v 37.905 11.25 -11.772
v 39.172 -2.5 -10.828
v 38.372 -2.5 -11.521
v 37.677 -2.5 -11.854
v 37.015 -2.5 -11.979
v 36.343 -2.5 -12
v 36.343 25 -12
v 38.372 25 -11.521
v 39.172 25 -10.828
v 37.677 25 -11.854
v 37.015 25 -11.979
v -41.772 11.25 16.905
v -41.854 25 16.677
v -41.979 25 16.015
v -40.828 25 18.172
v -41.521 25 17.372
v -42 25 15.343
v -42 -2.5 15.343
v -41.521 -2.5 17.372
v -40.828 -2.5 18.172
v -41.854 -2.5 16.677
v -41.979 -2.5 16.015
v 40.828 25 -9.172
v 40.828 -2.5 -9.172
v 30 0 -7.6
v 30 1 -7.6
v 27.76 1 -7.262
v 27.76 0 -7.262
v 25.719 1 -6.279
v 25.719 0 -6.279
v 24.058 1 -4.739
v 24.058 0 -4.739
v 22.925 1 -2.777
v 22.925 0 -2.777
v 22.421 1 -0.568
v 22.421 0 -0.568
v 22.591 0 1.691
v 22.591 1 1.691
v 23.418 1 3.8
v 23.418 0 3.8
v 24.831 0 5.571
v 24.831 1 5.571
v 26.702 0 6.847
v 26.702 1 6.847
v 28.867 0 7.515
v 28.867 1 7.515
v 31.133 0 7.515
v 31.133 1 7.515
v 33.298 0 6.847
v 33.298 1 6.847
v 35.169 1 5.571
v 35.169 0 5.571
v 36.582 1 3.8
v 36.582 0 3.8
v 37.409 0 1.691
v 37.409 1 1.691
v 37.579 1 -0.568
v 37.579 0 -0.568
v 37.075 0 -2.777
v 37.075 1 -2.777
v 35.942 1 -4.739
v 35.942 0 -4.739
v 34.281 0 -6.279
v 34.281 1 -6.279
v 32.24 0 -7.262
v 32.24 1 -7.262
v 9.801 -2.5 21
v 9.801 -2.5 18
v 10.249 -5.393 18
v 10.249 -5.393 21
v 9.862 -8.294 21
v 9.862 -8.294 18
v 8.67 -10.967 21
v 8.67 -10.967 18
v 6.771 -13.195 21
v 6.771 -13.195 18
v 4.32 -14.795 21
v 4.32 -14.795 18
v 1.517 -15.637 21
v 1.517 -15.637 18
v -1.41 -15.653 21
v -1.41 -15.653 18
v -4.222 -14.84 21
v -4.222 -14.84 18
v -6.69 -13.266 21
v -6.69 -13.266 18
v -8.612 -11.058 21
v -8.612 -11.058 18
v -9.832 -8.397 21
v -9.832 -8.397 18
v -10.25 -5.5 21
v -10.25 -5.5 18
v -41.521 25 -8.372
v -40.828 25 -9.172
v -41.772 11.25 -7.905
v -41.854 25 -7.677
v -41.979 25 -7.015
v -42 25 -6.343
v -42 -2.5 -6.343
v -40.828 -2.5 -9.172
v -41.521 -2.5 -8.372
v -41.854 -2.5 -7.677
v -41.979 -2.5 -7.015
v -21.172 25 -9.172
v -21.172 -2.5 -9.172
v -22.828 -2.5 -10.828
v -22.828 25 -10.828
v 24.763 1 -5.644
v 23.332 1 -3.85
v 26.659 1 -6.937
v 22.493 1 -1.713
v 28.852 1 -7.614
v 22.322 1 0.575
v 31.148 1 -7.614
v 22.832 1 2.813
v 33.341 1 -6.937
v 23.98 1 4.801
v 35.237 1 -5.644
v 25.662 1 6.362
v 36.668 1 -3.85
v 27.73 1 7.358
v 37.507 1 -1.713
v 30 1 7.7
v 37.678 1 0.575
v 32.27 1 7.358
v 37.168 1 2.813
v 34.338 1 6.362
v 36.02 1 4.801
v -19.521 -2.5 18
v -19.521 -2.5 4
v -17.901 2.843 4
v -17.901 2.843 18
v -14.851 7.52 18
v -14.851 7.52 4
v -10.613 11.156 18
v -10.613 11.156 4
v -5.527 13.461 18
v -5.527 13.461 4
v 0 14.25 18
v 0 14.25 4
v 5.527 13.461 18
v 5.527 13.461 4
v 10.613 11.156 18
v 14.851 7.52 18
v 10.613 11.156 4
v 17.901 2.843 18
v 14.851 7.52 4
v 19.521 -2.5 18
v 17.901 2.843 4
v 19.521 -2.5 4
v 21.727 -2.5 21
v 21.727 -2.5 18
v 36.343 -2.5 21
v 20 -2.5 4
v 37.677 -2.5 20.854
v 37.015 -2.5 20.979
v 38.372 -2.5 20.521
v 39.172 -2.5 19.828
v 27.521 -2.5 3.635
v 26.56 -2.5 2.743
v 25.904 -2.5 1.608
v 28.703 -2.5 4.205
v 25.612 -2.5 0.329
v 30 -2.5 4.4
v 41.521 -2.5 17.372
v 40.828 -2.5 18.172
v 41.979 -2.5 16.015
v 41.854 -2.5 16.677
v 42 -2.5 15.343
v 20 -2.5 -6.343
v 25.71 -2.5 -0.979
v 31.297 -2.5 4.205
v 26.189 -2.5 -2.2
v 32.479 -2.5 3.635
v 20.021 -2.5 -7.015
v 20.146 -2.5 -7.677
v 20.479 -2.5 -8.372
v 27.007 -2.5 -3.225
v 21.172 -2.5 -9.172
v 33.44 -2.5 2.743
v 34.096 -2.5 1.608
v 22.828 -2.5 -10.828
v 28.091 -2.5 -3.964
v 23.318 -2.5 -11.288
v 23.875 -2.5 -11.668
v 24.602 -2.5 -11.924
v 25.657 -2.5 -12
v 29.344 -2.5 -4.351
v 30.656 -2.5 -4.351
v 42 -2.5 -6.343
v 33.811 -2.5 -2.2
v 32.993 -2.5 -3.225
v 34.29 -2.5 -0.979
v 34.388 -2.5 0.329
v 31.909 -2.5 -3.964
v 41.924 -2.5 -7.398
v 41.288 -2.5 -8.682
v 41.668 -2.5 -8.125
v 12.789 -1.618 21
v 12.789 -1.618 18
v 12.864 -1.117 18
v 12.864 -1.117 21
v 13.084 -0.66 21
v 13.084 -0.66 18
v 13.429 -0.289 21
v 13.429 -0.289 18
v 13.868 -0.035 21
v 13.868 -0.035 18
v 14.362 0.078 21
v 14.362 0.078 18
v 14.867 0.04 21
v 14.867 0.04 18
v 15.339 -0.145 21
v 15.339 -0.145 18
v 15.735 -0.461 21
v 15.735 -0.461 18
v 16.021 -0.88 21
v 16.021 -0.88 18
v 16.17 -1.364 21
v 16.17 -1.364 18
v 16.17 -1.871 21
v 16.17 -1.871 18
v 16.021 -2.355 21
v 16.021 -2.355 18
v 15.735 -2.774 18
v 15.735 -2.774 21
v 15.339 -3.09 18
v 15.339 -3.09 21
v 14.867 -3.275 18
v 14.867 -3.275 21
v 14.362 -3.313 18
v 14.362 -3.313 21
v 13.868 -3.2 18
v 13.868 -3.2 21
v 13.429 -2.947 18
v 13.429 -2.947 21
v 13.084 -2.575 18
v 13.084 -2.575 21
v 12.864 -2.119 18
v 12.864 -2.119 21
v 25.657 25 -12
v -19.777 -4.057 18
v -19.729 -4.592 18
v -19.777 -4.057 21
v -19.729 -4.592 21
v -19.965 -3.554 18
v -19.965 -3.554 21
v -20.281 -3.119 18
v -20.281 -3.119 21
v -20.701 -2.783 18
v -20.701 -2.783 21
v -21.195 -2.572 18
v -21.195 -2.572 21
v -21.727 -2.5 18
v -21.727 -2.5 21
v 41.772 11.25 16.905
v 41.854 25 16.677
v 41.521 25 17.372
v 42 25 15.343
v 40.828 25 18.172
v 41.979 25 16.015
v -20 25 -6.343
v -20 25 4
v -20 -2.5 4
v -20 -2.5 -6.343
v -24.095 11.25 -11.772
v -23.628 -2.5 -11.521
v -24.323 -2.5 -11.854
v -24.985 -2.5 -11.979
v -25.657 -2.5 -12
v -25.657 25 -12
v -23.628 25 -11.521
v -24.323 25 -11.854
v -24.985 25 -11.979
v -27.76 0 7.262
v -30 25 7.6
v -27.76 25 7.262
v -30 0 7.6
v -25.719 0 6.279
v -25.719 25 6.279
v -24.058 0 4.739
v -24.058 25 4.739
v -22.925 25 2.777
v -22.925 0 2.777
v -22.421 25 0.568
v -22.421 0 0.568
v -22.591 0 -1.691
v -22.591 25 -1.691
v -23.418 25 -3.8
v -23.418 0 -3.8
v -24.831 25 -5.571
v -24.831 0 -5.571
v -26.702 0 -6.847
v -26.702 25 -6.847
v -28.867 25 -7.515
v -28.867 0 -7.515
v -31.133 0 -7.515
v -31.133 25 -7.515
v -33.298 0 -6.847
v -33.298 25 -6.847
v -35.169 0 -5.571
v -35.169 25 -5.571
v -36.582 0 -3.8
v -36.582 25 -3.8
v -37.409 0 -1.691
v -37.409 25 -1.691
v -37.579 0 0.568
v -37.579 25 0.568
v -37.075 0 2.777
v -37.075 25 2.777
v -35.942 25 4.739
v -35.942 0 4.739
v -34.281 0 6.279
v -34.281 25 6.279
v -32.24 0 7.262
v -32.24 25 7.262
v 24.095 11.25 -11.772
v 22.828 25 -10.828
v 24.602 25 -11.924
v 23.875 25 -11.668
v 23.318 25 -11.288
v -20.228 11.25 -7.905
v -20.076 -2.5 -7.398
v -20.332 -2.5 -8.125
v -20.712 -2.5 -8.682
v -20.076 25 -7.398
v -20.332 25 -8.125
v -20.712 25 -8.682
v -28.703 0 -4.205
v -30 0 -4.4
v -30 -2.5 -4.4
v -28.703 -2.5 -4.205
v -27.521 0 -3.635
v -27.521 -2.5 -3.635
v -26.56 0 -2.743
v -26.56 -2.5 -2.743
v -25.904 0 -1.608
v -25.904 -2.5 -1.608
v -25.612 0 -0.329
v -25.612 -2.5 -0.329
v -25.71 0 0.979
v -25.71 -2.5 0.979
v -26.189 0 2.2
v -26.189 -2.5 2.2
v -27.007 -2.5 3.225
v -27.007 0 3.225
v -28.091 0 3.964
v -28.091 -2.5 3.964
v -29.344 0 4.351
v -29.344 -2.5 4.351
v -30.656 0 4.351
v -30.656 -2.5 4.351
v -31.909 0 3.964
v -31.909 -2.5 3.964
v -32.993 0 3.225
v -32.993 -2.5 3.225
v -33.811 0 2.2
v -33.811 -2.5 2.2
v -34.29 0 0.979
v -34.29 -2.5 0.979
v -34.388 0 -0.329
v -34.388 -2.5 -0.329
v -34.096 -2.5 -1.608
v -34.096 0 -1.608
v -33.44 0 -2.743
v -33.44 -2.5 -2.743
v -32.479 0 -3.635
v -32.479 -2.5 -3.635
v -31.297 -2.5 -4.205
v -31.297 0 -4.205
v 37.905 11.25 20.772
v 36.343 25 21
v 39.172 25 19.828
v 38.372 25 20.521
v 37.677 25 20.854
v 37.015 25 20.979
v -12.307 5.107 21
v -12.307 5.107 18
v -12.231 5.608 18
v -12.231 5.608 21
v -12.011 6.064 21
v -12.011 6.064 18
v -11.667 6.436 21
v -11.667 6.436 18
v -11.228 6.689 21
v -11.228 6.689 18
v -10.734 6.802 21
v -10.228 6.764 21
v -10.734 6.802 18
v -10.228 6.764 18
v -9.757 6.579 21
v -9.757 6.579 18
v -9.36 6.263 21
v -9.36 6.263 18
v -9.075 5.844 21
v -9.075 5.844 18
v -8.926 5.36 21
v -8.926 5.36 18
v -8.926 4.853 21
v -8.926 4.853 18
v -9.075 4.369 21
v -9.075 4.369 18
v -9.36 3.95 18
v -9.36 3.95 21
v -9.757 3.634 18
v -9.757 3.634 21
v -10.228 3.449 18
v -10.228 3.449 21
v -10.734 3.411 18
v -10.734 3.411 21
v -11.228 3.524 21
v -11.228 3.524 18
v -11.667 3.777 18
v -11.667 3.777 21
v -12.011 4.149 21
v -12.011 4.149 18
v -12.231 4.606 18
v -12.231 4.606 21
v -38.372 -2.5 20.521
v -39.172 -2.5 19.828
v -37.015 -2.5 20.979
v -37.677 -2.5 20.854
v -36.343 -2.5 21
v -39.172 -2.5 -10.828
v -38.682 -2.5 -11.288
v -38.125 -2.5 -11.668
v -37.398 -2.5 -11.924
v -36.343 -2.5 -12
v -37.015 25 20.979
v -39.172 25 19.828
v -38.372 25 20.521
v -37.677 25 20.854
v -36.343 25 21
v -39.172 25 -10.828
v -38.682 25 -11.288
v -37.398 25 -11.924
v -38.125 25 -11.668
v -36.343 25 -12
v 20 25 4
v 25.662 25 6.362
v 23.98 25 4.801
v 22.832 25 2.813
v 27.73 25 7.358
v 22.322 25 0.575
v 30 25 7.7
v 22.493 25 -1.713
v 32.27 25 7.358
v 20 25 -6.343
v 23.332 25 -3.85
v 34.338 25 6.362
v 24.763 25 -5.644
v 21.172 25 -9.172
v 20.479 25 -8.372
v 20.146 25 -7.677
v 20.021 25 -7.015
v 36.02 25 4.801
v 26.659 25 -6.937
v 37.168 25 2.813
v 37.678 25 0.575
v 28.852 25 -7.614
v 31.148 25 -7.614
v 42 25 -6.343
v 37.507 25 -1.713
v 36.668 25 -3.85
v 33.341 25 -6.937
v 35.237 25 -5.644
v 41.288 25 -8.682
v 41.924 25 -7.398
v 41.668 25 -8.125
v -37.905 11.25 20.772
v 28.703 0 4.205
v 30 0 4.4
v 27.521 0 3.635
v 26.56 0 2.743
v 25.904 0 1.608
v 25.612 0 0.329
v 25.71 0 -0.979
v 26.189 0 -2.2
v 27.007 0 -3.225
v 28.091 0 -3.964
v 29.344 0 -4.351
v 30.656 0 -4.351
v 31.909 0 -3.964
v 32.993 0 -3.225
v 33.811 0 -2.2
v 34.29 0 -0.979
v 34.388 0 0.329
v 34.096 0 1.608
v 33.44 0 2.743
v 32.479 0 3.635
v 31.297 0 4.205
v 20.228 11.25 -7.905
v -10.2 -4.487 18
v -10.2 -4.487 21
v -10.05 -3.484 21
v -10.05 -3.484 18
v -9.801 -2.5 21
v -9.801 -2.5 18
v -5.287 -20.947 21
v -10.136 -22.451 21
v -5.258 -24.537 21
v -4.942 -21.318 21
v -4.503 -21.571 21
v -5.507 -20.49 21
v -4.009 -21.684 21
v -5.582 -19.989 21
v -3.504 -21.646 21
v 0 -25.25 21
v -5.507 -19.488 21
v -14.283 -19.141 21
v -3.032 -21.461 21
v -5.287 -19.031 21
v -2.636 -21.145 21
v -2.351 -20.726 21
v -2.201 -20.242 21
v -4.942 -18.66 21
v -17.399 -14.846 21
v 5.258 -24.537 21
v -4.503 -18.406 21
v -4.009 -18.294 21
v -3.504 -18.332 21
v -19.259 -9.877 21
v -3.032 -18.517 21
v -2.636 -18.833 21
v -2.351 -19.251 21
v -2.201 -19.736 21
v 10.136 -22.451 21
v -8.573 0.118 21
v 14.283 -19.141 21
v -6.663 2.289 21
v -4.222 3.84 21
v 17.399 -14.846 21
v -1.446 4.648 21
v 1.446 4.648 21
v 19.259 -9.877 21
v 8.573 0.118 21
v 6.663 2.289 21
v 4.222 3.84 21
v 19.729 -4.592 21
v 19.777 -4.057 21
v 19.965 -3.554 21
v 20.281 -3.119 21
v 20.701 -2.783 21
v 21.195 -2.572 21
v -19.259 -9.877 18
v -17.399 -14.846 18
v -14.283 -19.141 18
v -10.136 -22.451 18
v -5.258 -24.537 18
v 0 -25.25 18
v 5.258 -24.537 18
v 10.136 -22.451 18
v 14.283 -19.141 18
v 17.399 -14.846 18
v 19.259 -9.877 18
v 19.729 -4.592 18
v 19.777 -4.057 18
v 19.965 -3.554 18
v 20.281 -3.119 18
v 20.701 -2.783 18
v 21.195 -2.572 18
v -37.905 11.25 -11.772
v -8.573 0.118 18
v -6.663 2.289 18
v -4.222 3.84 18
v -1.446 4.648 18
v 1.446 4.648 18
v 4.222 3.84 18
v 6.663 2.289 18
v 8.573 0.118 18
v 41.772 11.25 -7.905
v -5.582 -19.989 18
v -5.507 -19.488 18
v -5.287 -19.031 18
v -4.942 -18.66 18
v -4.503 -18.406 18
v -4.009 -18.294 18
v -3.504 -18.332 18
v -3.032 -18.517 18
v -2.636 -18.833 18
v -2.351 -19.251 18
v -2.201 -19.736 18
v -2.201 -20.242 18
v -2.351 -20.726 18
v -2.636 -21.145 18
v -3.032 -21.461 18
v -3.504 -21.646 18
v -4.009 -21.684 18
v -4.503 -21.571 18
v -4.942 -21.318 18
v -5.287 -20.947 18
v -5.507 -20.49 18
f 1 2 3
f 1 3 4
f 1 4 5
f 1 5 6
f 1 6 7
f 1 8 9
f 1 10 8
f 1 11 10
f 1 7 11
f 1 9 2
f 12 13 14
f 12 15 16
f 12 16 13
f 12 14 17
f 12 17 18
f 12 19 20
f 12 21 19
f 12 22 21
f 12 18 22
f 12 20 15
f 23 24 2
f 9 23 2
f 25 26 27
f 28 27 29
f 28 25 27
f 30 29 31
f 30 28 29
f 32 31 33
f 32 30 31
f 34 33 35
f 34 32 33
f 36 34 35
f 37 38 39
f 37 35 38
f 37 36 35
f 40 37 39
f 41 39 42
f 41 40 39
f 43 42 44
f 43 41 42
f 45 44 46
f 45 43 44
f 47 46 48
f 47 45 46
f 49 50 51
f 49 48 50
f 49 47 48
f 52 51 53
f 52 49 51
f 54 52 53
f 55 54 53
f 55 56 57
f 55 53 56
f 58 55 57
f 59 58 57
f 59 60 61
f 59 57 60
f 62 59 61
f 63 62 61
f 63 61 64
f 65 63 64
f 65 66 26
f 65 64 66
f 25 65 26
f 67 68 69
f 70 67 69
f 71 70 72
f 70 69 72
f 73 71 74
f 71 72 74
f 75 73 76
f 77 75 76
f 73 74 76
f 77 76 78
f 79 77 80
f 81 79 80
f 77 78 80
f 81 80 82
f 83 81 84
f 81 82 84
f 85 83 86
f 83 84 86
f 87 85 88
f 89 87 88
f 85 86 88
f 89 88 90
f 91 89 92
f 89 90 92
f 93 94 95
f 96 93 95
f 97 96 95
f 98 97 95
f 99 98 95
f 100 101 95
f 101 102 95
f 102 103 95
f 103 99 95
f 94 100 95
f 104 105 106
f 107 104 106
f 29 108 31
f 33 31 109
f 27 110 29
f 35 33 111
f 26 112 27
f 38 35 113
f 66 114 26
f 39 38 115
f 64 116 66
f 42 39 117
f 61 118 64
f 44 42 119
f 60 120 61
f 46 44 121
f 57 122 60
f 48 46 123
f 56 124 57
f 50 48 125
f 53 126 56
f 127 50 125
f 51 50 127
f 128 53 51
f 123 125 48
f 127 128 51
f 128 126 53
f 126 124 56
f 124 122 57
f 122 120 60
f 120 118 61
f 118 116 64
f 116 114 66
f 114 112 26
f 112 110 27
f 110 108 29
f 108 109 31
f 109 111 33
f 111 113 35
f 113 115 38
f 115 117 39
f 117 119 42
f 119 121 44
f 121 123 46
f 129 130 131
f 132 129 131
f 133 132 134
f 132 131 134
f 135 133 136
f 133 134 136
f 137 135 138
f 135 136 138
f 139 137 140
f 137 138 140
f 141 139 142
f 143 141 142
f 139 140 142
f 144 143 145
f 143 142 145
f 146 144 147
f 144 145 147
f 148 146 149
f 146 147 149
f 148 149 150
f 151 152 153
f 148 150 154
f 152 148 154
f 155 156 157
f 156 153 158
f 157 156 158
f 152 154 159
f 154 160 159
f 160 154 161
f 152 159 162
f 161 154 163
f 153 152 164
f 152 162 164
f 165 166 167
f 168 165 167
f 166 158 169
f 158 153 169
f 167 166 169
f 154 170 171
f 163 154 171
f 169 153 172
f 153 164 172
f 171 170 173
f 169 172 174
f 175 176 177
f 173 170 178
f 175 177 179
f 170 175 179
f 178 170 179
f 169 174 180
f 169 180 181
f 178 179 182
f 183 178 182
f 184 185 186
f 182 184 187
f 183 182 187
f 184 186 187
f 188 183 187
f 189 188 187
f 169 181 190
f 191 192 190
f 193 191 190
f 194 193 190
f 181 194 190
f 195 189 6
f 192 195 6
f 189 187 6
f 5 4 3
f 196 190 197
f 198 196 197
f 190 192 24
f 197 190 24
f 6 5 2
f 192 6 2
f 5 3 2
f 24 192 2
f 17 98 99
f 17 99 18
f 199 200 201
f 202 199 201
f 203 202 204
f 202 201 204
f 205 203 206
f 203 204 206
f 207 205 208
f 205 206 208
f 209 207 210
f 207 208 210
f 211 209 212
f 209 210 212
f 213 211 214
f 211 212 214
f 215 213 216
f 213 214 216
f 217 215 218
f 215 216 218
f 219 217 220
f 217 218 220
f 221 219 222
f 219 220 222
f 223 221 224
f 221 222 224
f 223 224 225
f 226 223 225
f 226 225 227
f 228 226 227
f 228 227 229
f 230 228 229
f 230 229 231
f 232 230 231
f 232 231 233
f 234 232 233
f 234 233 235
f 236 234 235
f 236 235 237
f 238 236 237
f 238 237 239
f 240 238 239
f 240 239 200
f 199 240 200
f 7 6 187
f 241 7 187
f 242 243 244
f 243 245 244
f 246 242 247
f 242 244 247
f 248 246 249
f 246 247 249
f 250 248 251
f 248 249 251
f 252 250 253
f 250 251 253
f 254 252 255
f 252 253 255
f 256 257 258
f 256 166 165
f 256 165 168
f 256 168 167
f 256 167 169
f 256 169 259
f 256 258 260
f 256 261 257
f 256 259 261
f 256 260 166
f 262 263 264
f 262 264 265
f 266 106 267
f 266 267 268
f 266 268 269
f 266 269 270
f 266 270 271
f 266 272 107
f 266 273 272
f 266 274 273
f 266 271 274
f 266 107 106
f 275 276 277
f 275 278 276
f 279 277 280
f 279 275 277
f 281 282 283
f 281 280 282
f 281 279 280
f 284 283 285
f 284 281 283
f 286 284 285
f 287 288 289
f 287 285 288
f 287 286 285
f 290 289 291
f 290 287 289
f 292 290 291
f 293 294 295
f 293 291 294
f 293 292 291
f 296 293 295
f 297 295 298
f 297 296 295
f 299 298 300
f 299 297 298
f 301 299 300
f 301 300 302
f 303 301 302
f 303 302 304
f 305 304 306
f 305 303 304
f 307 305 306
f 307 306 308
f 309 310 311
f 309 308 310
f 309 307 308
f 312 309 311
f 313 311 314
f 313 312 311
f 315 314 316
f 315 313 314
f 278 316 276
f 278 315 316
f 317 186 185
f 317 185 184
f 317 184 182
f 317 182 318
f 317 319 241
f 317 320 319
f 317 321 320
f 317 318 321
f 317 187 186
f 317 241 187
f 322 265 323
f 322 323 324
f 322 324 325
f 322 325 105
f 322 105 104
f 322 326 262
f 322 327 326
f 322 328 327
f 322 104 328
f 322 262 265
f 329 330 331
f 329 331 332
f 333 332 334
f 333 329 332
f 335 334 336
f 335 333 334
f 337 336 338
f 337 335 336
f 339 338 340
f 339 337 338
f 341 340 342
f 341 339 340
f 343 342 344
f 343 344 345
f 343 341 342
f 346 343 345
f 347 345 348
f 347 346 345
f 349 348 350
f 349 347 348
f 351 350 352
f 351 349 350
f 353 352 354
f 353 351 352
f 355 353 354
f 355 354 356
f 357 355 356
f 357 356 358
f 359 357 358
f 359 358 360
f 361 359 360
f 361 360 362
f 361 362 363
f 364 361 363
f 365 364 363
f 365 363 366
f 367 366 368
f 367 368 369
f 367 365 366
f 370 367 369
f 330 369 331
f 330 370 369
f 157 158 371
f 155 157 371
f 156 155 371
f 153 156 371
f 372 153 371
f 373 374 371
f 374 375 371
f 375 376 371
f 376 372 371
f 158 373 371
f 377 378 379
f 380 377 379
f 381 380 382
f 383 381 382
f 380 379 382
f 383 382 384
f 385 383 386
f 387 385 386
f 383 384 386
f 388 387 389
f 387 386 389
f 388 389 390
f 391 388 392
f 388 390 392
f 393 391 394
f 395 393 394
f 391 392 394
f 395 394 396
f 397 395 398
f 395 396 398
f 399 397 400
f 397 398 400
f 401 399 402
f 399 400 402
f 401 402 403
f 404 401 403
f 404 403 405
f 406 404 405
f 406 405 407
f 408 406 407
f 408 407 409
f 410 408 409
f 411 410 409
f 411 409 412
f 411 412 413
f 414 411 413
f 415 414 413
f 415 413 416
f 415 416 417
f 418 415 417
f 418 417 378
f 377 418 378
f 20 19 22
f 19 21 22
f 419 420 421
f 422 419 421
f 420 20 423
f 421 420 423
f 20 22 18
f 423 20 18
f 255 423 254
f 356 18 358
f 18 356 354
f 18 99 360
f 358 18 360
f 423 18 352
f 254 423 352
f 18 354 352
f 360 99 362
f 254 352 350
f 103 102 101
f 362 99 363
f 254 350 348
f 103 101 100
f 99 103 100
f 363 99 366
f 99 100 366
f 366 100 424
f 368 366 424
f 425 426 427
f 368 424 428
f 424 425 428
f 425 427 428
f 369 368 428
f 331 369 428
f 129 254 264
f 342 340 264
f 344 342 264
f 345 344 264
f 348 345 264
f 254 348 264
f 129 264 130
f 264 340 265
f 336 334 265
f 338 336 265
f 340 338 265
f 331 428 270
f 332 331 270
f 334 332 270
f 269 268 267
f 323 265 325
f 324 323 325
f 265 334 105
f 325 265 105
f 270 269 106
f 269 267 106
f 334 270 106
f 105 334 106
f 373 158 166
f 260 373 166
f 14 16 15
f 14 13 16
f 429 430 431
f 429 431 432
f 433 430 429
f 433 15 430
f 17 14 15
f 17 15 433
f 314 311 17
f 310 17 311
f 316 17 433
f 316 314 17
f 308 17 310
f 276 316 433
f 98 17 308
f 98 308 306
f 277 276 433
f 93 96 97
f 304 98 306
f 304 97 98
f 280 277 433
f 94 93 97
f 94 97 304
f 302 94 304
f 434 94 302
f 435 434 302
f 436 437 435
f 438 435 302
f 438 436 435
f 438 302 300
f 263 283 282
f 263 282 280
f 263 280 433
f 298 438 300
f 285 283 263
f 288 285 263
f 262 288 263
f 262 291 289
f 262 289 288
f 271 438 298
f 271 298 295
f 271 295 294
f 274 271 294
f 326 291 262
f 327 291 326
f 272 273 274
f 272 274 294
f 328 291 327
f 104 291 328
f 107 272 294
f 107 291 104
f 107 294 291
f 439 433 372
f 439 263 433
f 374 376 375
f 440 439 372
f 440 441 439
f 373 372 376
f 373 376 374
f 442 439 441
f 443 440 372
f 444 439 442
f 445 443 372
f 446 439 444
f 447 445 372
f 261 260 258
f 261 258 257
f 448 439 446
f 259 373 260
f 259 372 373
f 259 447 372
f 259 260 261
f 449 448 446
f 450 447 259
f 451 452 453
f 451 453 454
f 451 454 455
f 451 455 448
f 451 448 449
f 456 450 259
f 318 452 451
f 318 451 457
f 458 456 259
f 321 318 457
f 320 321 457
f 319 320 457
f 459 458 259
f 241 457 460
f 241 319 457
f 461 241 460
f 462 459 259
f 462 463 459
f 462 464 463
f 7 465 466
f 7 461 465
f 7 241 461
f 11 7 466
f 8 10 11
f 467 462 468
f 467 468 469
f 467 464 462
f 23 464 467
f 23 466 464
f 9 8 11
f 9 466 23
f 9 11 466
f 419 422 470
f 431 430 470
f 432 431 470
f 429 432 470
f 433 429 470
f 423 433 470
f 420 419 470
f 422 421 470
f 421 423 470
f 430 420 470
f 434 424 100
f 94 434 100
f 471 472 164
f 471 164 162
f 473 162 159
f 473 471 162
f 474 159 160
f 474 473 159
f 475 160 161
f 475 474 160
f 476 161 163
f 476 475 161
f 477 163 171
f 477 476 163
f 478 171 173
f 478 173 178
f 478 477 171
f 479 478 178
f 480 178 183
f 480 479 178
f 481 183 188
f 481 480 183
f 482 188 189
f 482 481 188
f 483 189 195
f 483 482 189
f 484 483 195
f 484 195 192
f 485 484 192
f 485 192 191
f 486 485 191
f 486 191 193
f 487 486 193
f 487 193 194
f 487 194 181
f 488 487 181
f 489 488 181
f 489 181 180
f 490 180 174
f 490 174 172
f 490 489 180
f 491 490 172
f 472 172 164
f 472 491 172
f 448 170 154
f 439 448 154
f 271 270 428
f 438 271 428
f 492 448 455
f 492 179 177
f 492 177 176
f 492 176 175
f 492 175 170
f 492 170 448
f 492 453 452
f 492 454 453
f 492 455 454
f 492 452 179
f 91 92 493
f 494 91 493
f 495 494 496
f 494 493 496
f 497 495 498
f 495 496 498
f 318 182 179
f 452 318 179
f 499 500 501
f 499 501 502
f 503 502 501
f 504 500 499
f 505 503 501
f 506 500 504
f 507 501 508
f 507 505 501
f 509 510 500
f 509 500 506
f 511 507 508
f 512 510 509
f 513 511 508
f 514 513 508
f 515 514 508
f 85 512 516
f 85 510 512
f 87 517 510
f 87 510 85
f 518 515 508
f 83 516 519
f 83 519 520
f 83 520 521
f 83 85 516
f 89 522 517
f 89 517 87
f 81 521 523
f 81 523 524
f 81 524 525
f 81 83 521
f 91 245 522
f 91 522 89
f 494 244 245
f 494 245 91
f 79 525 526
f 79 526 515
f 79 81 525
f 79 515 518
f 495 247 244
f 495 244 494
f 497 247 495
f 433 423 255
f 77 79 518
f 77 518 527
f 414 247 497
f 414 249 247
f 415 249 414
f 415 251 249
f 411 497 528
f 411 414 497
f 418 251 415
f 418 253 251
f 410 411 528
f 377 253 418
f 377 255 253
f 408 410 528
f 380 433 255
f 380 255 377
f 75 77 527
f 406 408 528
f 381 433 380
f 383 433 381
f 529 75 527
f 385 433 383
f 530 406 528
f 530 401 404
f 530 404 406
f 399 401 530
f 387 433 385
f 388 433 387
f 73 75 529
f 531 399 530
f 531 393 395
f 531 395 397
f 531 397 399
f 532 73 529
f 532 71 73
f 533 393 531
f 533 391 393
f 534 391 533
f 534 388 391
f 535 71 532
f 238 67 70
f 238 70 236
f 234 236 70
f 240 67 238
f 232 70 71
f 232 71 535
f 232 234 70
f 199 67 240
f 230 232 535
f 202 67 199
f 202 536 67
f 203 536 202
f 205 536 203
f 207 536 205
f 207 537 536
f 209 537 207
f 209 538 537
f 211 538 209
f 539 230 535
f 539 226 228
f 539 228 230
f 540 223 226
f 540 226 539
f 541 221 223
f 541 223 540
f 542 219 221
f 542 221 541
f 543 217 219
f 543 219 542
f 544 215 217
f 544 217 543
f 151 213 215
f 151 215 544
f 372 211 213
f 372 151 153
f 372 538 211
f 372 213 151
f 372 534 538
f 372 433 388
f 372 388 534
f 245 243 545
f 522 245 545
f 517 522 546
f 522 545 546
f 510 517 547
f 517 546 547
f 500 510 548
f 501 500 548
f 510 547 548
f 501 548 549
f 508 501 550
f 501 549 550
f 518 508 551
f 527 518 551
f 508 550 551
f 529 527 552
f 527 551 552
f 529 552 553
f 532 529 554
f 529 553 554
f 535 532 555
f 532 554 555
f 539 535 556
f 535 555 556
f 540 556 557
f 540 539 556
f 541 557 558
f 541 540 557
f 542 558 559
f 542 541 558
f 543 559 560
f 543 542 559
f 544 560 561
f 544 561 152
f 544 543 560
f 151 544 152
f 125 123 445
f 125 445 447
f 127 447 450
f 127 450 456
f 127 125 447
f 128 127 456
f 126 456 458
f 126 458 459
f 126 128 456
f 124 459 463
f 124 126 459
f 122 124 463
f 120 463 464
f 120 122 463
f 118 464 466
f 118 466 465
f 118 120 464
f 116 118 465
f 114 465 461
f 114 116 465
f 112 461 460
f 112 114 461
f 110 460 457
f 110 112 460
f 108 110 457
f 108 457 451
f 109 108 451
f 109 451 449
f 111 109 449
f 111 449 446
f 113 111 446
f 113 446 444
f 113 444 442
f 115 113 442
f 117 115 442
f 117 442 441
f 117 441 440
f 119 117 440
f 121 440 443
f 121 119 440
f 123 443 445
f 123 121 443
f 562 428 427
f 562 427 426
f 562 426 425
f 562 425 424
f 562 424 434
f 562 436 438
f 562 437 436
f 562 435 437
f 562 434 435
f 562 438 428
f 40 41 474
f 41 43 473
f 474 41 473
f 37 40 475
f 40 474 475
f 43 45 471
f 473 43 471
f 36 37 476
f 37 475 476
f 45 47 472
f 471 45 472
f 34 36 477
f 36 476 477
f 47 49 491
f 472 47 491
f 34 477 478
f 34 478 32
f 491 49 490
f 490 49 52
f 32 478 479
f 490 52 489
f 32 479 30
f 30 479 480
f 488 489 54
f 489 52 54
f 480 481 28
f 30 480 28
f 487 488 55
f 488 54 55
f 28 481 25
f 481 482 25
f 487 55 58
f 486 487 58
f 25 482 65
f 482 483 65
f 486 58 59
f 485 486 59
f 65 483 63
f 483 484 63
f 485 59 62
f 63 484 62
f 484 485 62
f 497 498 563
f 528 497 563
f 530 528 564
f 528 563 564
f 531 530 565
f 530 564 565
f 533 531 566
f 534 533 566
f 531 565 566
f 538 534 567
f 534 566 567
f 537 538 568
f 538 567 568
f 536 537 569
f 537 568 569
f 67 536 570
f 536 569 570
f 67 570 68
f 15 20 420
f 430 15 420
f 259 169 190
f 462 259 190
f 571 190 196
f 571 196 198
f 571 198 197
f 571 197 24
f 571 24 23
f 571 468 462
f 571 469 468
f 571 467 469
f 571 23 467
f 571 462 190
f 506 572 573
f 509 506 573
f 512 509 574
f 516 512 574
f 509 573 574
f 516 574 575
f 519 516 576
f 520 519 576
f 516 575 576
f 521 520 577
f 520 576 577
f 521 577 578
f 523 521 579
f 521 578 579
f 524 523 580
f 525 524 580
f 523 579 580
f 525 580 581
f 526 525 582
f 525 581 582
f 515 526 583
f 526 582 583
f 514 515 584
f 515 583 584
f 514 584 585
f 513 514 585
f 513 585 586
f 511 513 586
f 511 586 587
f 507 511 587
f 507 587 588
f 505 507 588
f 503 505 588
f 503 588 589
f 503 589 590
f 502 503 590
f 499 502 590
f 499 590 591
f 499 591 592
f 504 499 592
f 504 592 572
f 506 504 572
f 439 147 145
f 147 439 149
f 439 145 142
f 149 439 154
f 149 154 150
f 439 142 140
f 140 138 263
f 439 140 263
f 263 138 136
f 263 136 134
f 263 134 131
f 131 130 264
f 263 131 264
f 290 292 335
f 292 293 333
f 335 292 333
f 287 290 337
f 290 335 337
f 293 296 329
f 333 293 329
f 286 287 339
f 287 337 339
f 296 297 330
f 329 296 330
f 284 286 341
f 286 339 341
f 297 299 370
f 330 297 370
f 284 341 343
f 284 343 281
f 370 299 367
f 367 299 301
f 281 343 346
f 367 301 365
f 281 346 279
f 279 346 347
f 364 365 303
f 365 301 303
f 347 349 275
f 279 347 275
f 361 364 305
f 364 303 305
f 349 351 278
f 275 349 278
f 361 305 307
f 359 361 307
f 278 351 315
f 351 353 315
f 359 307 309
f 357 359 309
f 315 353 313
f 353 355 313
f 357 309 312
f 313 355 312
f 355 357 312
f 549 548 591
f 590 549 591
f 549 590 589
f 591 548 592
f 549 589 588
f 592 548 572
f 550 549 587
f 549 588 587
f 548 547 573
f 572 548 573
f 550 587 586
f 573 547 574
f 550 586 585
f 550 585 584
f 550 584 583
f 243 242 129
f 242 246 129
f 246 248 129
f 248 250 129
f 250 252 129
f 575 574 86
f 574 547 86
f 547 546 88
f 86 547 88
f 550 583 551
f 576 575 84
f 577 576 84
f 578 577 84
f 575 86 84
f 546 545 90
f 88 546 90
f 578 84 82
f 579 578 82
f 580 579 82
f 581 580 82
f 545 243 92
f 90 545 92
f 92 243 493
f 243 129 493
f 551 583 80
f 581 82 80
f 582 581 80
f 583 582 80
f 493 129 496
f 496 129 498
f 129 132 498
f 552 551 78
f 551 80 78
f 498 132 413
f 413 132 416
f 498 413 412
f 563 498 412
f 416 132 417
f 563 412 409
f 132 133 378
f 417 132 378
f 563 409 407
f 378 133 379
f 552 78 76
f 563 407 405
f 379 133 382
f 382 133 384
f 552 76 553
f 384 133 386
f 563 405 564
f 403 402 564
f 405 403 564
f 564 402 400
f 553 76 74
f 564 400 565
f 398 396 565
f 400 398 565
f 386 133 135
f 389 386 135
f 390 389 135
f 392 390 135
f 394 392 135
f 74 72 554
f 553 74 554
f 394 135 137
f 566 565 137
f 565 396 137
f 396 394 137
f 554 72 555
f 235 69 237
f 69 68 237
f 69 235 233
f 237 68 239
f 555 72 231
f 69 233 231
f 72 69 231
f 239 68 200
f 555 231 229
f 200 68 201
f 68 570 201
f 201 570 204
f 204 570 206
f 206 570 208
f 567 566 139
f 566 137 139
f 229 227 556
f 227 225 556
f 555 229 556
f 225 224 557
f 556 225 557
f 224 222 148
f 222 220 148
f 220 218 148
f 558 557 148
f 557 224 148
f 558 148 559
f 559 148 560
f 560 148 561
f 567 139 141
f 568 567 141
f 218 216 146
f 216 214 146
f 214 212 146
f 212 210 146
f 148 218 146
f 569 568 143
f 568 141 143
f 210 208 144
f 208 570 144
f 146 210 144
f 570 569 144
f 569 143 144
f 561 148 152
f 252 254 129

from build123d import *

# Parameters (mm, degrees)
ESQUISSE1_R             = 7.6
BOSS_EXTRU_1_DEPTH      = 25
ESQUISSE3_R             = 7.6
ESQUISSE3_R_2           = 4.4
BOSS_EXTRU_3_DEPTH      = 2.5
BOSS_EXTRU_3_2_DEPTH    = 2.5
BOSS_EXTRU_5_START      = -2.5
ESQUISSE1_4_R           = 7.6
BOSS_EXTRU_5_DEPTH      = 2.5
ESQUISSE7_R             = 19.75
ESQUISSE7_R_2           = 1.7
ESQUISSE7_R_3           = 10.25
ENL_V_MAT_EXTRU_1_DEPTH = 14
BOSS_EXTRU_9_START      = -3
BOSS_EXTRU_9_DEPTH      = 3
ESQUISSE7_4_R           = 1.7
ENL_V_MAT_EXTRU_2_DEPTH = 52.87063246
ENL_V_START             = -24
ESQUISSE11_R            = 7.6
ESQUISSE11_R_2          = 7.7
ENL_V_MAT_EXTRU_3_DEPTH = 24
CONG_2_R                = 2


with BuildPart() as part:
    # Esquisse1 → Boss.-Extru.1 (new body)
    with BuildSketch(Plane(origin=(0, 0, 0), x_dir=(1, 0, 0), z_dir=(0, 1, 0))):
        Polygon((-26, -21), (26, -21), (38, -21), (42, -17), (42, 0), (42, 8), (38, 12), (24, 12), (20, 8), (20, 1), (20, -4), (17, -4), (-17, -4), (-20, -4), (-20, 1), (-20, 8), (-24, 12), (-38, 12), (-42, 8), (-42, 0), (-42, -17), (-38, -21), align=None)
        with Locations(Location((-30, 0, 0), (0, 0, 270))):
            Circle(ESQUISSE1_R, mode=Mode.SUBTRACT)
        with Locations(Location((30, 0, 0), (0, 0, 90))):
            Circle(ESQUISSE1_R, mode=Mode.SUBTRACT)
    extrude(amount=BOSS_EXTRU_1_DEPTH)


with BuildPart() as body_2:
    # Esquisse3 → Boss.-Extru.3 (new body)
    with BuildSketch(Plane.XZ):
        with Locations(Location((-30, 0, 0), (0, 0, 90))):
            Circle(ESQUISSE3_R)
        with Locations(Location((-30, 0, 0), (0, 0, 270))):
            Circle(ESQUISSE3_R_2, mode=Mode.SUBTRACT)
    extrude(amount=BOSS_EXTRU_3_DEPTH)


with BuildPart() as body_3:
    # Esquisse3 → Boss.-Extru.3 2 (new body)
    with BuildSketch(Plane.XZ):
        with Locations(Location((30, 0, 0), (0, 0, 270))):
            Circle(ESQUISSE3_R)
        with Locations(Location((30, 0, 0), (0, 0, 90))):
            Circle(ESQUISSE3_R_2, mode=Mode.SUBTRACT)
    extrude(amount=BOSS_EXTRU_3_2_DEPTH)


with BuildPart() as boss_extru_5_tool:
    # Esquisse1<4> → Boss.-Extru.5 (new body)
    with BuildSketch(Plane(origin=(0, 0, 0), x_dir=(1, 0, 0), z_dir=(0, 1, 0)).offset(BOSS_EXTRU_5_START)):
        Polygon((-26, -21), (26, -21), (38, -21), (42, -17), (42, 0), (42, 8), (38, 12), (24, 12), (20, 8), (20, 1), (20, -4), (17, -4), (-17, -4), (-20, -4), (-20, 1), (-20, 8), (-24, 12), (-38, 12), (-42, 8), (-42, 0), (-42, -17), (-38, -21), align=None)
        with Locations(Location((-30, 0, 0), (0, 0, 90))):
            Circle(ESQUISSE1_4_R, mode=Mode.SUBTRACT)
        with Locations(Location((30, 0, 0), (0, 0, 90))):
            Circle(ESQUISSE1_4_R, mode=Mode.SUBTRACT)
    extrude(amount=BOSS_EXTRU_5_DEPTH)


with BuildPart() as part_1:
    add(part.part)


with BuildPart() as part_2:
    # Boss.-Extru.5: joined with boss_extru_5_tool
    add(part_1.part.fuse(boss_extru_5_tool.part, body_2.part, body_3.part, tol=0.00001))

    # Congé1
    # a fillet whose section is not a circle: 4 mm, written as the material it takes off along each edge
    with BuildSketch(Plane(origin=(-42, 29.142135624, 17), x_dir=(0, 0, -1), z_dir=(0, -1, 0)), Plane(origin=(-38, -6.642135624, -12), x_dir=(-0.707106781186547, 0, 0.7071067811865481), z_dir=(0, 1, 0)), Plane(origin=(-24, -6.642135624, -12), x_dir=(-1, 0, 0), z_dir=(0, 1, 0)), Plane(origin=(-20, -6.642135624, -8), x_dir=(-0.707106781186547, 0, -0.7071067811865481), z_dir=(0, 1, 0)), Plane(origin=(42, -6.642135624, 17), x_dir=(0, 0, -1), z_dir=(0, 1, 0)), Plane(origin=(42, -6.642135624, -8), x_dir=(-0.7071067811865487, 0, -0.7071067811865465), z_dir=(0, 1, 0)), Plane(origin=(38, -6.642135624, -12), x_dir=(-1, 0, 0), z_dir=(0, 1, 0)), Plane(origin=(24, -6.642135624, -12), x_dir=(-0.7071067811865459, 0, 0.7071067811865491), z_dir=(0, 1, 0)), Plane(origin=(20, -6.642135624, -8), x_dir=(0, 0, 1), z_dir=(0, 1, 0))) as cong_1_piece_1:
        with BuildLine():
            add(Edge.make_bspline([(1.656854249, 0), (1.35356905, 0), (1.050283851, 0), (0.373674798, 0.056927592), (-0.223974097, 0.30448187), (-0.742662833, 0.742662833), (-0.957117854, 0.957117854), (-1.171572875, 1.171572875)], knots=[0, 0, 0, 0, 0, 0, 0.5, 0.5, 1, 1, 1, 1, 1, 1], degree=5))
            Line((-1.171572875, 1.171572875), (0, 0))
            Line((0, 0), (1.656854249, 0))
        make_face()
    extrude(amount=35.784271247, mode=Mode.SUBTRACT)
    with BuildSketch(Plane(origin=(-42, 29.142135624, -8), x_dir=(0, 0, 1), z_dir=(0, -1, 0)), Plane(origin=(-38, 29.142135624, 21), x_dir=(1, 0, 0), z_dir=(0, -1, 0)), Plane(origin=(38, -6.642135624, 21), x_dir=(-1, 0, 0), z_dir=(0, 1, 0))) as cong_1_piece_2:
        with BuildLine():
            add(Edge.make_bspline([(1.656854249, 0), (1.35356905, 0), (1.050283851, 0), (0.373674798, -0.056927592), (-0.223974097, -0.30448187), (-0.742662833, -0.742662833), (-0.957117854, -0.957117854), (-1.171572875, -1.171572875)], knots=[0, 0, 0, 0, 0, 0, 0.5, 0.5, 1, 1, 1, 1, 1, 1], degree=5))
            Line((-1.171572875, -1.171572875), (0, 0))
            Line((0, 0), (1.656854249, 0))
        make_face()
    extrude(amount=35.784271247, mode=Mode.SUBTRACT)

    # Esquisse7 → Enlèv. mat.-Extru.1 (cut)
    with BuildSketch(Plane(origin=(0, 0, 4), x_dir=(-1, 0, 0), z_dir=(0, 0, -1))):
        with Locations((0, -5.5)):
            Circle(ESQUISSE7_R)
        with Locations((-14.488887394, -1.617714323)):
            Circle(ESQUISSE7_R_2, mode=Mode.SUBTRACT)
        with Locations((10.606601718, 5.106601718)):
            Circle(ESQUISSE7_R_2, mode=Mode.SUBTRACT)
        with Locations((3.882285677, -19.988887394)):
            Circle(ESQUISSE7_R_2, mode=Mode.SUBTRACT)
        with Locations((0, -5.5)):
            Circle(ESQUISSE7_R_3, mode=Mode.SUBTRACT)
        with Locations((-9.899494937, -15.399494937)):
            Circle(ESQUISSE7_R_2, mode=Mode.SUBTRACT)
    extrude(amount=-ENL_V_MAT_EXTRU_1_DEPTH, mode=Mode.SUBTRACT)

    # Esquisse10 → Boss.-Extru.9 (add)
    with BuildSketch(Plane.XY.offset(21).offset(BOSS_EXTRU_9_START)):
        with BuildLine():
            Line((19.520822216, -2.5), (-19.520822216, -2.5))
            ThreePointArc((-19.520822216, -2.5), (0, -25.25), (19.520822216, -2.5))
        make_face()
    extrude(amount=BOSS_EXTRU_9_DEPTH)

    # Esquisse7<4> → Enlèv. mat.-Extru.2 (cut, through all)
    with BuildSketch(Plane(origin=(0, 0, 4), x_dir=(-1, 0, 0), z_dir=(0, 0, -1))):
        with Locations((3.882285677, -19.988887394)):
            Circle(ESQUISSE7_4_R)
        with Locations((-14.488887394, -1.617714323)):
            Circle(ESQUISSE7_4_R)
        with Locations((10.606601718, 5.106601718)):
            Circle(ESQUISSE7_4_R)
        with BuildLine():
            Line((-9.801147892, -2.5), (9.801147892, -2.5))
            ThreePointArc((9.801147892, -2.5), (0, 4.75), (-9.801147892, -2.5))
        make_face()
        with BuildLine():
            ThreePointArc((10.25, -5.5), (10.137165923, -3.983303902), (9.801147892, -2.5))
            Line((9.801147892, -2.5), (-9.801147892, -2.5))
            ThreePointArc((-9.801147892, -2.5), (-1.516696098, -15.637165923), (10.25, -5.5))
        make_face()
    extrude(amount=-ENL_V_MAT_EXTRU_2_DEPTH, mode=Mode.SUBTRACT)

    # Esquisse11 → Enlèv. mat.-Extru.3 (cut)
    with BuildSketch(Plane(origin=(0, 25, 0), x_dir=(1, 0, 0), z_dir=(0, 1, 0)).offset(ENL_V_START)):
        with Locations(Location((-30, 0, 0), (0, 0, 90))):
            Circle(ESQUISSE11_R)
        with Locations(Location((30, 0, 0), (0, 0, 270))):
            Circle(ESQUISSE11_R_2)
    extrude(amount=ENL_V_MAT_EXTRU_3_DEPTH, mode=Mode.SUBTRACT)

    # Congé2
    cong_2_edges = [part_2.edges().sort_by_distance(p)[0] for p in [
        (-19.520822216, -2.5, 19.5),
        (19.520822216, -2.5, 19.5),
    ]]
    fillet(cong_2_edges, radius=CONG_2_R)


solid = part_2.part
